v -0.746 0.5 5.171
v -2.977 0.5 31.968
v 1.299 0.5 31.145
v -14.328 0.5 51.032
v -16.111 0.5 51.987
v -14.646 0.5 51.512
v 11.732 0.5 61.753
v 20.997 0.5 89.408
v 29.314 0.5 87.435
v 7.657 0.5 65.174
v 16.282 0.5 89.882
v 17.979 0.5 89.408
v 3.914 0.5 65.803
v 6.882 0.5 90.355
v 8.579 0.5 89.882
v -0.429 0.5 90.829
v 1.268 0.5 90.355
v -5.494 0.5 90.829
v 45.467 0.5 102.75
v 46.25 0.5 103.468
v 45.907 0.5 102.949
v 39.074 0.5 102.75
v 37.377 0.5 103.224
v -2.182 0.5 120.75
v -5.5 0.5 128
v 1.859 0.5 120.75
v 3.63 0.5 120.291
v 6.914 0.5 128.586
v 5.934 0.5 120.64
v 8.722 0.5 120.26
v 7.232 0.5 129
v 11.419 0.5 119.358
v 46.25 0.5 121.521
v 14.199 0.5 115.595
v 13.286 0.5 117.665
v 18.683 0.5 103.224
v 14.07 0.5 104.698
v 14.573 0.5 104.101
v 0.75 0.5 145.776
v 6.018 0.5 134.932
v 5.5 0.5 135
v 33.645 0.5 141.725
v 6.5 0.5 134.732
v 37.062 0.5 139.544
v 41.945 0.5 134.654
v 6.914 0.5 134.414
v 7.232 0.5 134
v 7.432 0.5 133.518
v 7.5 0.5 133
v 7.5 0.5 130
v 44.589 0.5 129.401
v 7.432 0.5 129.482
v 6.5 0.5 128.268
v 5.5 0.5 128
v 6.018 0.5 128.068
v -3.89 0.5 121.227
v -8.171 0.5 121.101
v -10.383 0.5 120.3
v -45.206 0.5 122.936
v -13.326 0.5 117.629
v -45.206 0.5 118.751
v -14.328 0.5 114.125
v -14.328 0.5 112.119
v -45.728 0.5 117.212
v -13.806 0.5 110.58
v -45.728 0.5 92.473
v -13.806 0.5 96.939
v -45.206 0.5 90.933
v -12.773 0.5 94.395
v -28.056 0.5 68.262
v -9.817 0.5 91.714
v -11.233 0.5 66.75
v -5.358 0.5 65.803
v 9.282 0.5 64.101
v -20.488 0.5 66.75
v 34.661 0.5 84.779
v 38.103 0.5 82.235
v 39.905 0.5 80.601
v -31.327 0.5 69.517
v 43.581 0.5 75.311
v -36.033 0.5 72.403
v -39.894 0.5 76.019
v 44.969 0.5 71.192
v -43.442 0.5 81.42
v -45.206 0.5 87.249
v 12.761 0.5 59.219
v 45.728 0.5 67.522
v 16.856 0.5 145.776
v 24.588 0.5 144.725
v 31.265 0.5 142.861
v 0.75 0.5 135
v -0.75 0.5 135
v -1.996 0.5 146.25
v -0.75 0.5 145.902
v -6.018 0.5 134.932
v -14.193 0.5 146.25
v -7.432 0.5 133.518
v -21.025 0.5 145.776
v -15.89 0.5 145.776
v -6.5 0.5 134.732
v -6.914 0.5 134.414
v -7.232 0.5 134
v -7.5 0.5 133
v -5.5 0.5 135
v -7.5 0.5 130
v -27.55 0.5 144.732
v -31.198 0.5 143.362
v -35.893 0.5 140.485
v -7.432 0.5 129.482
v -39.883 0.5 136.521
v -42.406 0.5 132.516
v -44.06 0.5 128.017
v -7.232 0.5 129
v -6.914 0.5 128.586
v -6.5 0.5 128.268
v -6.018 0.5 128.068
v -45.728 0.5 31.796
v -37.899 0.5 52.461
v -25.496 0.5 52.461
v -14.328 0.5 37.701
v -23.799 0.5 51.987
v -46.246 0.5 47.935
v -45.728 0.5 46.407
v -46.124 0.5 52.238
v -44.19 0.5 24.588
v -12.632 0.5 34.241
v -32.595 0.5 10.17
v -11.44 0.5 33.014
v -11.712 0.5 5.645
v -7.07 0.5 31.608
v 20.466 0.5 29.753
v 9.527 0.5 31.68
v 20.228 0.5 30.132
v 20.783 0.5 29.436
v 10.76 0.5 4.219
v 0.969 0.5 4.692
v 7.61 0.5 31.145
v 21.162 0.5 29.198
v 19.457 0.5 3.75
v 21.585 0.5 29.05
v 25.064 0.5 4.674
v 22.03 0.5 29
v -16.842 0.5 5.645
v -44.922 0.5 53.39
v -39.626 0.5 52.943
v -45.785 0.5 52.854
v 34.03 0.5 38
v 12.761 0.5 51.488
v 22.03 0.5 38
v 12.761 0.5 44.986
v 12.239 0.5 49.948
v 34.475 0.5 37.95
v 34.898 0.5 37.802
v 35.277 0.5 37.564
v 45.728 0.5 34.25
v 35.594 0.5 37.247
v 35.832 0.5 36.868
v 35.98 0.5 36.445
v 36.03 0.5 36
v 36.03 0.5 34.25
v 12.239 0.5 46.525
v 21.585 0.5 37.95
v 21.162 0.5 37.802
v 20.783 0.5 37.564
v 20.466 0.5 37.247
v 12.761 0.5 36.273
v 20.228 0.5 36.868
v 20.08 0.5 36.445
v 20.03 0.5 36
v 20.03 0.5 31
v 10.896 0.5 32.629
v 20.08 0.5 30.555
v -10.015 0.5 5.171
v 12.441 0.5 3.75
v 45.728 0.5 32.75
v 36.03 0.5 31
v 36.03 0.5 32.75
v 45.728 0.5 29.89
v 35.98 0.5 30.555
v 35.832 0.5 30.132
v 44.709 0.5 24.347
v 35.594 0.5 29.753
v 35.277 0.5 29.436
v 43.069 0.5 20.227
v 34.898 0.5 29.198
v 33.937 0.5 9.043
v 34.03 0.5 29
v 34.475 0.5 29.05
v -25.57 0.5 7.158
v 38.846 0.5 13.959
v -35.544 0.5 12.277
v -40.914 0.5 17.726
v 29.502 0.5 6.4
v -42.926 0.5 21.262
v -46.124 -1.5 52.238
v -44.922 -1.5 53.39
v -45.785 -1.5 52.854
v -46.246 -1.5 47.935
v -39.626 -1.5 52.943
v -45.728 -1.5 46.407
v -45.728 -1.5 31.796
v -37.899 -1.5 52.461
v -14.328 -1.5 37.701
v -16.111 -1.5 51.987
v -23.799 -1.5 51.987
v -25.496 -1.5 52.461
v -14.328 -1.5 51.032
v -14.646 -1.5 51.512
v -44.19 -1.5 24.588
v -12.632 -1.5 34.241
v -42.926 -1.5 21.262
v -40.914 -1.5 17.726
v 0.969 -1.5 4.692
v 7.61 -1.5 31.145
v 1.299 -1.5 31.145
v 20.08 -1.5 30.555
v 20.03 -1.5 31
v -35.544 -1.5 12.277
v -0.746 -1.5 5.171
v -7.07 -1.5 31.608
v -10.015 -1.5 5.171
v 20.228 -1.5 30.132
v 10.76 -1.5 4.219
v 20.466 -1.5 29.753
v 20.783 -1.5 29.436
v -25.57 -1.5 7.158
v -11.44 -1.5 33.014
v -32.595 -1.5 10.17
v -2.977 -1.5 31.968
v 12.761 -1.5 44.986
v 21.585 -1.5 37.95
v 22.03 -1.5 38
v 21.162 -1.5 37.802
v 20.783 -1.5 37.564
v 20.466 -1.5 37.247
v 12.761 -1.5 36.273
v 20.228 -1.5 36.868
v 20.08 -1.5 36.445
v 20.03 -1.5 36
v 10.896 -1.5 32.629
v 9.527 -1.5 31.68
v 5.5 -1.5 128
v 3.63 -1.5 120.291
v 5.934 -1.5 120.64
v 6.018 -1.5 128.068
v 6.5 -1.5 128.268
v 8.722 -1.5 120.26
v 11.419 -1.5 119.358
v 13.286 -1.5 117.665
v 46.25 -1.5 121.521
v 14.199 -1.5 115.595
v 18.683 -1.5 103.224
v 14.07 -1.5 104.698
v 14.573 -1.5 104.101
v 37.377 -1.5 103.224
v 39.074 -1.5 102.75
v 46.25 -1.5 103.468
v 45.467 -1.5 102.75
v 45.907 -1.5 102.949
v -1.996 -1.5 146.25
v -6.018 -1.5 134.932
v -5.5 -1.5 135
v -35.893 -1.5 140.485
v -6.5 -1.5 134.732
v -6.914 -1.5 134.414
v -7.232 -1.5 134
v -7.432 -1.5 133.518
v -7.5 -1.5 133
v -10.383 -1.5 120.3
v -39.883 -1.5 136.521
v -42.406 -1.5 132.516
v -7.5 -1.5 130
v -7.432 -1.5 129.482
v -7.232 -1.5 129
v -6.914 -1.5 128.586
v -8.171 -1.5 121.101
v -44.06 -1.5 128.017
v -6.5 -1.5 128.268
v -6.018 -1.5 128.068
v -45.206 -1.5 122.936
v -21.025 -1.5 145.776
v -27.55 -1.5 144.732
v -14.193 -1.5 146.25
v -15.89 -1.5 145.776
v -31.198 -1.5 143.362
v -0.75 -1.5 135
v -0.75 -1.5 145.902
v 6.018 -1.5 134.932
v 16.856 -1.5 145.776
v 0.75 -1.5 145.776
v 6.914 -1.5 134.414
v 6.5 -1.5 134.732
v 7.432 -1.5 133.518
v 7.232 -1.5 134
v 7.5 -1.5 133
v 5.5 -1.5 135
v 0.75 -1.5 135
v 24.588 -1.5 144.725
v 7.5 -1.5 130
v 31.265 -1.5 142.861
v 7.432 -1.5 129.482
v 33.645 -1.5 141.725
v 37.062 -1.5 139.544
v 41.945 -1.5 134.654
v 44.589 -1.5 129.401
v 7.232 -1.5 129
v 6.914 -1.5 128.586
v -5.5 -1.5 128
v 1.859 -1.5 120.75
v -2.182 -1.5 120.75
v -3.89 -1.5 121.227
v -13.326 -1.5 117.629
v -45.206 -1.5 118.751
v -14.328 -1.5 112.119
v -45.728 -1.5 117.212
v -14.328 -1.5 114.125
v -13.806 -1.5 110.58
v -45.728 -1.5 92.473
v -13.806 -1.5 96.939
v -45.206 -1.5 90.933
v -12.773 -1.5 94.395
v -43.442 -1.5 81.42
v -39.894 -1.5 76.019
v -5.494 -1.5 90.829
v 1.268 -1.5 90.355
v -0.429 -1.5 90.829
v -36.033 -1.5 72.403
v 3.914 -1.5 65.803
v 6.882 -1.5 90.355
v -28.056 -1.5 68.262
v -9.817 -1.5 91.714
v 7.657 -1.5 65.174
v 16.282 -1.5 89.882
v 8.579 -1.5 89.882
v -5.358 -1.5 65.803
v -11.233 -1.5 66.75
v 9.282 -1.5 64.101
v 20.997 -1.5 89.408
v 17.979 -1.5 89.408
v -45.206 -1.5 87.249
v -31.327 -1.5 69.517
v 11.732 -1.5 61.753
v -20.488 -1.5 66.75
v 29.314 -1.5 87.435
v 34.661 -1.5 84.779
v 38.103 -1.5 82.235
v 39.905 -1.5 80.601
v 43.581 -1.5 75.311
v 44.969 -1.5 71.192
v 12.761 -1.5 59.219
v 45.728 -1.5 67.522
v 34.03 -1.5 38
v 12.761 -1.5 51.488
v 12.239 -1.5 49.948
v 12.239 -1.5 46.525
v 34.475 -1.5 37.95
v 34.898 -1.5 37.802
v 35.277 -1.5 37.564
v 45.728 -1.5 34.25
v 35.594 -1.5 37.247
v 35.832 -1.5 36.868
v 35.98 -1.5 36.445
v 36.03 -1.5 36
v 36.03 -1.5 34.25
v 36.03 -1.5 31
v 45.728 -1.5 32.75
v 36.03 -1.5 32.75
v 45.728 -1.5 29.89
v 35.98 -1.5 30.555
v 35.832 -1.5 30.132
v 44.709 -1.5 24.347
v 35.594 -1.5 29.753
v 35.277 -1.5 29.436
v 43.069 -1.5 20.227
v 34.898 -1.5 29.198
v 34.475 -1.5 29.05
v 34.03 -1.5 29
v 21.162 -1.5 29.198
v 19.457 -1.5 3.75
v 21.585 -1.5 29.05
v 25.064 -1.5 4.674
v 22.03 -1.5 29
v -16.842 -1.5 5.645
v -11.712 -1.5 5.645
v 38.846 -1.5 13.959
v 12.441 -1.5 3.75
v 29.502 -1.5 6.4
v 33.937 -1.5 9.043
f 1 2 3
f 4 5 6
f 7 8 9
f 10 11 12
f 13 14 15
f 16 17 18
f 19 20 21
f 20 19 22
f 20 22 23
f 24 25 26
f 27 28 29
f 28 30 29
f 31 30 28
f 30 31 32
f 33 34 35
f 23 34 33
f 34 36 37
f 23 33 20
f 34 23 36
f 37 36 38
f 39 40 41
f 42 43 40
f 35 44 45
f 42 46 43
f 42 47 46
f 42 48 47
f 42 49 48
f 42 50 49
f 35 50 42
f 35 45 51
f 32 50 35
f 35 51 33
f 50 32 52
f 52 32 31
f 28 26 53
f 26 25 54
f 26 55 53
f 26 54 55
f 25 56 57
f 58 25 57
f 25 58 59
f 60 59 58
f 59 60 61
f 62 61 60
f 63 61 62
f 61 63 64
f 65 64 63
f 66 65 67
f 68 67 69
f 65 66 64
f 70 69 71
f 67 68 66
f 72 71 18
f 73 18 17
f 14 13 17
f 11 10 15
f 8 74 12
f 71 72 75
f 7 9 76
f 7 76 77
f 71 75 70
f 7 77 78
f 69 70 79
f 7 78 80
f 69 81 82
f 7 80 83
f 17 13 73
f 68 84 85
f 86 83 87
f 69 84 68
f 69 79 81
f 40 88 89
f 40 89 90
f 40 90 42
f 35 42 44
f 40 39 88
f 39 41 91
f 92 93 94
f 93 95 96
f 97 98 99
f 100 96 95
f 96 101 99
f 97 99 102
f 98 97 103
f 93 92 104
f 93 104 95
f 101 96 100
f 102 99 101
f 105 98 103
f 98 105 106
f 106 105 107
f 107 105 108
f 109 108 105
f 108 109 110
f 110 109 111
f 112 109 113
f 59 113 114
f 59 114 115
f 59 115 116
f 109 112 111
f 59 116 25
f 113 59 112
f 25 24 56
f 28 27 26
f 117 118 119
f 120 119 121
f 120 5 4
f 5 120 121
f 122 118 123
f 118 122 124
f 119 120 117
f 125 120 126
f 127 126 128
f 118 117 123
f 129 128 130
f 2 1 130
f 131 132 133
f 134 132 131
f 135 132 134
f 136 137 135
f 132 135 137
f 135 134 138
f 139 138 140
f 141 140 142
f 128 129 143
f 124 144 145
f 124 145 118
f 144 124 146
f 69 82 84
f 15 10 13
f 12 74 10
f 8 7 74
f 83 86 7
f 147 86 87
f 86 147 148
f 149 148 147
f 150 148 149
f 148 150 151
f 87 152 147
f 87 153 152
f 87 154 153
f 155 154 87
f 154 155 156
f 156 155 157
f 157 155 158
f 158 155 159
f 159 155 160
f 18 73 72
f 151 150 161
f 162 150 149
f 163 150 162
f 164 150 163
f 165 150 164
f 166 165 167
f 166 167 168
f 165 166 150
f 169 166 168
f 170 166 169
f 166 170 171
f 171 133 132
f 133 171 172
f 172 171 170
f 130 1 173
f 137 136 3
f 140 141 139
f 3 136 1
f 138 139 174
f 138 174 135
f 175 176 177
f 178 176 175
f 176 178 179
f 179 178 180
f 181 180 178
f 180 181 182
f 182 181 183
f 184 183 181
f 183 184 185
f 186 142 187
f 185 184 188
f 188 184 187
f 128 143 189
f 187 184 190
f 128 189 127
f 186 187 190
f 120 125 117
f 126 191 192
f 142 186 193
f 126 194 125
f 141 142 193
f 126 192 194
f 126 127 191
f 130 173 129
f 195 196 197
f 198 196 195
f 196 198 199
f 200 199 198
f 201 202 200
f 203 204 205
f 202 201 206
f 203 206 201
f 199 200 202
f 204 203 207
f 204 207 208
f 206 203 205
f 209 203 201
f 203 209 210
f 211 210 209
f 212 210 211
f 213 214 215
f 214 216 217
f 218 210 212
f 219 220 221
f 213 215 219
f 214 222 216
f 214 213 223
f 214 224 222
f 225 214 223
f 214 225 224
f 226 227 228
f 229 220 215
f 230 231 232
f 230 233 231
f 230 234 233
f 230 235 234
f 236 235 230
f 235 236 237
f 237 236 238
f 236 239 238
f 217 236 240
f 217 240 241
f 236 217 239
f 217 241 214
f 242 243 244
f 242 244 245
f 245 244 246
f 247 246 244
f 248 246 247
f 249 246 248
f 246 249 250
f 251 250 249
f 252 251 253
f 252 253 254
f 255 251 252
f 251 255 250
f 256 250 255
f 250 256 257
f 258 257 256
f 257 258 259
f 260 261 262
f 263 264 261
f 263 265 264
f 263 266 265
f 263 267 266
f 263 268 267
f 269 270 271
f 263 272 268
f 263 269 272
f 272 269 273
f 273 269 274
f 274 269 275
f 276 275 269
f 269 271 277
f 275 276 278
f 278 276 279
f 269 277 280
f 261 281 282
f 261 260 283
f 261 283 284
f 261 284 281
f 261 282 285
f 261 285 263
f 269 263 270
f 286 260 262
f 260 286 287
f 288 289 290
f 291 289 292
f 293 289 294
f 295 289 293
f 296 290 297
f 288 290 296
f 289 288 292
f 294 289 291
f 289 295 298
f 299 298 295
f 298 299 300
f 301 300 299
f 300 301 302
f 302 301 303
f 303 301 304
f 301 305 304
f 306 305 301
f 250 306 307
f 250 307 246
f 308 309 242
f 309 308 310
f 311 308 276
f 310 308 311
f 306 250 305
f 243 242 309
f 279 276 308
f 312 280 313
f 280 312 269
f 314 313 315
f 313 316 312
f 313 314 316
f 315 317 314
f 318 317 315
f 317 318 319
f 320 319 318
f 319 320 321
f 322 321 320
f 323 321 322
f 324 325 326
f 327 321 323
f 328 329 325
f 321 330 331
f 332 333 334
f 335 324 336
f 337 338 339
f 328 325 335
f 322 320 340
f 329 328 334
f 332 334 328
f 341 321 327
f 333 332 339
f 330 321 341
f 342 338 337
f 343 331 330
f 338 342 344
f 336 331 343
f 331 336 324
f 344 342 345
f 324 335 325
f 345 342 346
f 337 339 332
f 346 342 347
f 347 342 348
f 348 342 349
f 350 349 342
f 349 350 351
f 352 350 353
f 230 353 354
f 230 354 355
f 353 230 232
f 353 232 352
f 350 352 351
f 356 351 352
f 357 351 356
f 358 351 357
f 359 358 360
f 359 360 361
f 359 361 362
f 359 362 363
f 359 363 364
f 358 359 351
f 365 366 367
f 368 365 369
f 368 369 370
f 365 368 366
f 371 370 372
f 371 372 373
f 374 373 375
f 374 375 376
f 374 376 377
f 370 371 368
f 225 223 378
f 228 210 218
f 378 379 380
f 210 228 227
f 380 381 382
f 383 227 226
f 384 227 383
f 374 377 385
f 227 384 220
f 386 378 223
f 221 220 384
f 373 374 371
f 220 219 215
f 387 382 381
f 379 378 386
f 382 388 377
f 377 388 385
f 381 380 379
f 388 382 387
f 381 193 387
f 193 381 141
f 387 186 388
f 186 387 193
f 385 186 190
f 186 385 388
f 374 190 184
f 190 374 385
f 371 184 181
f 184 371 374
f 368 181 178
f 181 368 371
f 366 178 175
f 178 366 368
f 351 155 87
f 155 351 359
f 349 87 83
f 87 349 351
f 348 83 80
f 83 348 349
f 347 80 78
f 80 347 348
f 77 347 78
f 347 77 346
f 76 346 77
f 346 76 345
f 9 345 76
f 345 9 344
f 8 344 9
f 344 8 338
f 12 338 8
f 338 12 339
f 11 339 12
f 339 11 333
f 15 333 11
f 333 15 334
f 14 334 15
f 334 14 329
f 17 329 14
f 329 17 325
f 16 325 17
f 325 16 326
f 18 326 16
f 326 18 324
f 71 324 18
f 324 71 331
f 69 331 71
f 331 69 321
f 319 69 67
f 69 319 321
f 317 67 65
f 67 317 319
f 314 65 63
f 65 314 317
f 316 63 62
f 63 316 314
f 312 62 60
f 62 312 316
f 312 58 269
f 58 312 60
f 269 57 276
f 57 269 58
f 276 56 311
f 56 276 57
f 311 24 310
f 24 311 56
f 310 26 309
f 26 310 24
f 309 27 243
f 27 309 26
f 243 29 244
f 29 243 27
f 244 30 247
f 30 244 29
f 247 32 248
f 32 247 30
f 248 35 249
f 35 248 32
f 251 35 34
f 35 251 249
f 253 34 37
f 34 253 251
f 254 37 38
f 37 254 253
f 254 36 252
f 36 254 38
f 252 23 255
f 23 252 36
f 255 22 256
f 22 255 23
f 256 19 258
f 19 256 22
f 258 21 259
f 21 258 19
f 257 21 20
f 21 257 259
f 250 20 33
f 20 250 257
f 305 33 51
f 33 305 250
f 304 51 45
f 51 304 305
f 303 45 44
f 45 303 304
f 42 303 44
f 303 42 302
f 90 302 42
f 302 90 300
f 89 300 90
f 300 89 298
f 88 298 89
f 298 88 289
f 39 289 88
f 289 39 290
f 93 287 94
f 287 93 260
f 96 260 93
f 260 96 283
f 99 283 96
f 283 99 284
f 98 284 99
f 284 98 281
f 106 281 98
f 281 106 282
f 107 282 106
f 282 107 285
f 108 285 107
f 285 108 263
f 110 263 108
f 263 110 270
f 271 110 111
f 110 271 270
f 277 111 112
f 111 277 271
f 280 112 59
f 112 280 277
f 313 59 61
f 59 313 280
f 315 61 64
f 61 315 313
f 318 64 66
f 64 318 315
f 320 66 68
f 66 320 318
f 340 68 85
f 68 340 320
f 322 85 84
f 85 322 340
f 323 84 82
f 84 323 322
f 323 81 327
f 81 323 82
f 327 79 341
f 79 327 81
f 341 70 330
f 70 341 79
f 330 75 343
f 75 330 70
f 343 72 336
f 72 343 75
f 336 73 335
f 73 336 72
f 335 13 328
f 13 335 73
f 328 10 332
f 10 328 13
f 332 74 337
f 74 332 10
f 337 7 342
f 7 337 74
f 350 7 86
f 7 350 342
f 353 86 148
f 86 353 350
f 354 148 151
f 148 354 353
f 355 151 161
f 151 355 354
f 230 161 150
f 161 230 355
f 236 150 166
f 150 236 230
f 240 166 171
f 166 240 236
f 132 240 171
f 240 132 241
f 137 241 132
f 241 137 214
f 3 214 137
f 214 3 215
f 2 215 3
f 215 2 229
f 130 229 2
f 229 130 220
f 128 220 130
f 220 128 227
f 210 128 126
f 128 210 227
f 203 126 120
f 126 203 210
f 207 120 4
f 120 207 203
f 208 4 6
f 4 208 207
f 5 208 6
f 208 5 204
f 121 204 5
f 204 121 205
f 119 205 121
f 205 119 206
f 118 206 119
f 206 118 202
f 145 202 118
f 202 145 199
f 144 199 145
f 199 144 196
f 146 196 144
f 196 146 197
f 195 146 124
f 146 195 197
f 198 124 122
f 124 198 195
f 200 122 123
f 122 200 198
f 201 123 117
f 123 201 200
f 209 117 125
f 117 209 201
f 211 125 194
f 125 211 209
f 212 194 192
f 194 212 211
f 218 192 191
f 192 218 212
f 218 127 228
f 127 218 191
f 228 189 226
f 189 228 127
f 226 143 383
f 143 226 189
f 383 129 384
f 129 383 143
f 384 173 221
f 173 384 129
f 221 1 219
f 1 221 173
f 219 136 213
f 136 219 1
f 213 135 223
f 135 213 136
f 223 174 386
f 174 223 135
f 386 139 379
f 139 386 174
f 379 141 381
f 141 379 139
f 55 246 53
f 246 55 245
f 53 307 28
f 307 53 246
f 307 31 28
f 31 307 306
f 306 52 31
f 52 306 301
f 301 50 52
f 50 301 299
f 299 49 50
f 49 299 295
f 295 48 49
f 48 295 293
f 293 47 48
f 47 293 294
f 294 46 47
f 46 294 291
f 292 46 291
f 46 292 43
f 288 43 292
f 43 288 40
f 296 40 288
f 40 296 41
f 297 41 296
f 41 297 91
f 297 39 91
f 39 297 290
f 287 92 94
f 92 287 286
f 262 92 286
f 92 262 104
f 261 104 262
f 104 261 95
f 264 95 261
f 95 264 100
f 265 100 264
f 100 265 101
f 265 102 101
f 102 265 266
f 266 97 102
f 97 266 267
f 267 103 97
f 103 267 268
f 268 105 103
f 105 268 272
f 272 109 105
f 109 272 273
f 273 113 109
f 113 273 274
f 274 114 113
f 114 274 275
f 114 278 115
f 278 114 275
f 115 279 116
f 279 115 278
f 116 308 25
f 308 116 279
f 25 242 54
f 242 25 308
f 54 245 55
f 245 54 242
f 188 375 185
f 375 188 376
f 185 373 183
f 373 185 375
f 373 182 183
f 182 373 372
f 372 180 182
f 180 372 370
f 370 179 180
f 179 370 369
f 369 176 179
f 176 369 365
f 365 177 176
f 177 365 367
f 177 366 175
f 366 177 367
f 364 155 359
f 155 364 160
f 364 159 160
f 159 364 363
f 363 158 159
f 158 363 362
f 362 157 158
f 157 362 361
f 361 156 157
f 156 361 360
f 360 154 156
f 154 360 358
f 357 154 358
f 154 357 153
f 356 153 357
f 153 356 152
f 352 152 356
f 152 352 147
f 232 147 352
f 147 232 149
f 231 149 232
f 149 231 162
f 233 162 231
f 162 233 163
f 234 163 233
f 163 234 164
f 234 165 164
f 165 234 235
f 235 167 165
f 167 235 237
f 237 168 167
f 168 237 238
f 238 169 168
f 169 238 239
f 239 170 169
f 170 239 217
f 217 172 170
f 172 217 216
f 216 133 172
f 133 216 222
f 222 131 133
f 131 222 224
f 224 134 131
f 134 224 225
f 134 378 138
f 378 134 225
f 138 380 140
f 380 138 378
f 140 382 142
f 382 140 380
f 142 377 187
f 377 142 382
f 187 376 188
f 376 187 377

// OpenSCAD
// file: shape_pts.scad
// Letter "S" (#9 Bottom Anchor) ? Top X=0 Conduit + Sealed Bottom + Sparkle Motion Mini Bay
// Vertical-display edition: bottom divider clip removed, interlocking hollow double-dovetail channels added.

shape_w = 94.00;
shape_h = 144.00;

rec_snap_top_x = -0.81;
rec_snap_top_z = 144.00;
rec_snap_bot_x = 3.51;

rec_top_conn_enable   = true;
rec_top_conn_x        = 0.00;
rec_bot_conn_enable   = false;
rec_bot_conn_x        = 0.00;
rec_left_conn_enable  = false;
rec_left_conn_z       = 0.00;
rec_left_conn_face_x  = 0.00;
rec_left_conn_pocket_x = 0.00;
rec_right_conn_enable = false;
rec_right_conn_z      = 0.00;
rec_right_conn_face_x = 0.00;
rec_right_conn_pocket_x = 0.00;

rec_magnet_enable = true;
rec_magnet_x      = 28.80;
rec_magnet_z      = 120.20;

rec_wall_mount_enable = false;
rec_wall_mount_x      = 0.00;
rec_wall_mount_z      = 75.00;

rec_include_controller = true;
rec_chip_x     = 28.50;
rec_chip_z     = 55.00;
rec_cable_x    = 28.50;
rec_ziptie_z   = 30.50;
rec_keyhole_z  = 18.00;
rec_slit_dir   = 1;

rec_pillars = [[-28.0, 118.0], [-28.0, 86.0]];
rec_has_face_grooves = false;

shape_pts = [[47.000,118.599],[47.000,100.243],[46.413,99.355],[45.629,99.000],[38.971,99.000],[37.274,99.474],[18.604,99.474],[14.165,100.421],[13.317,101.428],[13.447,112.441],[12.664,114.217],[11.032,115.697],[8.551,116.526],[5.940,116.882],[3.590,116.526],[1.763,117.000],[-2.285,117.000],[-3.982,117.474],[-8.029,117.355],[-9.988,116.645],[-12.664,114.217],[-13.578,111.020],[-13.578,109.243],[-13.056,107.704],[-13.056,94.086],[-12.142,91.836],[-9.465,89.408],[-5.418,88.579],[-0.326,88.579],[1.371,88.105],[6.985,88.105],[8.682,87.632],[16.385,87.632],[18.082,87.158],[21.085,87.158],[29.571,85.145],[35.054,82.421],[38.579,79.816],[40.472,78.099],[44.258,72.651],[45.694,68.388],[46.478,64.599],[46.478,26.822],[45.433,21.138],[43.736,16.875],[39.428,10.480],[34.401,5.447],[29.832,2.724],[25.263,0.947],[19.518,0.000],[12.338,0.000],[10.640,0.474],[0.849,0.947],[-0.849,1.421],[-10.118,1.421],[-11.815,1.895],[-16.907,1.895],[-25.785,3.434],[-32.965,6.513],[-36.033,8.704],[-41.517,14.270],[-43.606,17.941],[-44.911,21.375],[-46.478,28.717],[-46.478,43.283],[-47.000,44.822],[-46.869,49.441],[-46.347,50.388],[-45.107,51.158],[-39.493,50.684],[-37.796,50.211],[-25.393,50.211],[-23.696,49.737],[-15.993,49.737],[-14.165,49.145],[-13.578,48.257],[-13.578,34.875],[-12.011,31.678],[-11.032,30.671],[-6.985,29.368],[-2.938,29.724],[1.371,28.895],[7.507,28.895],[9.204,29.368],[10.314,30.138],[12.011,33.454],[12.011,41.862],[11.489,43.401],[11.489,47.072],[12.011,48.612],[12.011,56.072],[11.097,58.322],[8.812,60.513],[7.376,61.461],[3.851,62.053],[-5.418,62.053],[-11.293,63.000],[-20.562,63.000],[-28.265,64.539],[-31.660,65.842],[-36.490,68.803],[-40.472,72.533],[-44.128,78.099],[-45.956,84.138],[-45.956,87.809],[-46.478,89.349],[-46.478,114.336],[-45.956,115.875],[-45.956,120.020],[-44.781,125.230],[-43.083,129.849],[-40.472,133.993],[-36.360,138.079],[-31.529,141.039],[-27.743,142.461],[-21.085,143.526],[-15.993,143.526],[-14.296,144.000],[-1.893,144.000],[-0.196,143.526],[16.907,143.526],[24.740,142.461],[31.529,140.566],[34.010,139.382],[37.535,137.132],[42.561,132.099],[45.303,126.651]];
shape_paths = [[0, 1, 2, 3, 4, 5, 6, 7, 8, 9, 10, 11, 12, 13, 14, 15, 16, 17, 18, 19, 20, 21, 22, 23, 24, 25, 26, 27, 28, 29, 30, 31, 32, 33, 34, 35, 36, 37, 38, 39, 40, 41, 42, 43, 44, 45, 46, 47, 48, 49, 50, 51, 52, 53, 54, 55, 56, 57, 58, 59, 60, 61, 62, 63, 64, 65, 66, 67, 68, 69, 70, 71, 72, 73, 74, 75, 76, 77, 78, 79, 80, 81, 82, 83, 84, 85, 86, 87, 88, 89, 90, 91, 92, 93, 94, 95, 96, 97, 98, 99, 100, 101, 102, 103, 104, 105, 106, 107, 108, 109, 110, 111, 112, 113, 114, 115, 116, 117, 118, 119, 120, 121, 122, 123, 124, 125, 126]];

diffuser_shape_pts = [[47.000,118.599],[47.000,100.243],[46.413,99.355],[45.629,99.000],[38.971,99.000],[37.274,99.474],[18.604,99.474],[14.165,100.421],[13.317,101.428],[13.447,112.441],[12.664,114.217],[11.032,115.697],[8.551,116.526],[5.940,116.882],[3.590,116.526],[1.763,117.000],[-2.285,117.000],[-3.982,117.474],[-8.029,117.355],[-9.988,116.645],[-12.664,114.217],[-13.578,111.020],[-13.578,109.243],[-13.056,107.704],[-13.056,94.086],[-12.142,91.836],[-9.465,89.408],[-5.418,88.579],[-0.326,88.579],[1.371,88.105],[6.985,88.105],[8.682,87.632],[16.385,87.632],[18.082,87.158],[21.085,87.158],[29.571,85.145],[35.054,82.421],[38.579,79.816],[40.472,78.099],[44.258,72.651],[45.694,68.388],[46.478,64.599],[46.478,26.822],[45.433,21.138],[43.736,16.875],[39.428,10.480],[34.401,5.447],[29.832,2.724],[25.263,0.947],[19.518,0.000],[12.338,0.000],[10.640,0.474],[0.849,0.947],[-0.849,1.421],[-10.118,1.421],[-11.815,1.895],[-16.907,1.895],[-25.785,3.434],[-32.965,6.513],[-36.033,8.704],[-41.517,14.270],[-43.606,17.941],[-44.911,21.375],[-46.478,28.717],[-46.478,43.283],[-47.000,44.822],[-46.869,49.441],[-46.347,50.388],[-45.107,51.158],[-39.493,50.684],[-37.796,50.211],[-25.393,50.211],[-23.696,49.737],[-15.993,49.737],[-14.165,49.145],[-13.578,48.257],[-13.578,34.875],[-12.011,31.678],[-11.032,30.671],[-6.985,29.368],[-2.938,29.724],[1.371,28.895],[7.507,28.895],[9.204,29.368],[10.314,30.138],[12.011,33.454],[12.011,41.862],[11.489,43.401],[11.489,47.072],[12.011,48.612],[12.011,56.072],[11.097,58.322],[8.812,60.513],[7.376,61.461],[3.851,62.053],[-5.418,62.053],[-11.293,63.000],[-20.562,63.000],[-28.265,64.539],[-31.660,65.842],[-36.490,68.803],[-40.472,72.533],[-44.128,78.099],[-45.956,84.138],[-45.956,87.809],[-46.478,89.349],[-46.478,114.336],[-45.956,115.875],[-45.956,120.020],[-44.781,125.230],[-43.083,129.849],[-40.472,133.993],[-36.360,138.079],[-31.529,141.039],[-27.743,142.461],[-21.085,143.526],[-15.993,143.526],[-14.296,144.000],[-1.893,144.000],[-0.196,143.526],[16.907,143.526],[24.740,142.461],[31.529,140.566],[34.010,139.382],[37.535,137.132],[42.561,132.099],[45.303,126.651]];
diffuser_shape_paths = [[0, 1, 2, 3, 4, 5, 6, 7, 8, 9, 10, 11, 12, 13, 14, 15, 16, 17, 18, 19, 20, 21, 22, 23, 24, 25, 26, 27, 28, 29, 30, 31, 32, 33, 34, 35, 36, 37, 38, 39, 40, 41, 42, 43, 44, 45, 46, 47, 48, 49, 50, 51, 52, 53, 54, 55, 56, 57, 58, 59, 60, 61, 62, 63, 64, 65, 66, 67, 68, 69, 70, 71, 72, 73, 74, 75, 76, 77, 78, 79, 80, 81, 82, 83, 84, 85, 86, 87, 88, 89, 90, 91, 92, 93, 94, 95, 96, 97, 98, 99, 100, 101, 102, 103, 104, 105, 106, 107, 108, 109, 110, 111, 112, 113, 114, 115, 116, 117, 118, 119, 120, 121, 122, 123, 124, 125, 126]];

module shape_2d(pts = shape_pts) {
    polygon(points = pts, paths = shape_paths);
}

module diffuser_shape_2d(pts = diffuser_shape_pts) {
    polygon(points = pts, paths = diffuser_shape_paths);
}

module diffuser_face_grooves_2d() {}
// main file
// Letter "S" (#9 Bottom Anchor) ? Top X=0 Conduit + Sealed Bottom + Sparkle Motion Mini Bay ? internal white reflector plate (2.00 mm thick, aligned LED-strip conduit pockets + entry slits)
// Opens and exports standalone in OpenSCAD / OpenSCAD.js.

use <lamp_core.scad>

render_lamp_part("reflector");
